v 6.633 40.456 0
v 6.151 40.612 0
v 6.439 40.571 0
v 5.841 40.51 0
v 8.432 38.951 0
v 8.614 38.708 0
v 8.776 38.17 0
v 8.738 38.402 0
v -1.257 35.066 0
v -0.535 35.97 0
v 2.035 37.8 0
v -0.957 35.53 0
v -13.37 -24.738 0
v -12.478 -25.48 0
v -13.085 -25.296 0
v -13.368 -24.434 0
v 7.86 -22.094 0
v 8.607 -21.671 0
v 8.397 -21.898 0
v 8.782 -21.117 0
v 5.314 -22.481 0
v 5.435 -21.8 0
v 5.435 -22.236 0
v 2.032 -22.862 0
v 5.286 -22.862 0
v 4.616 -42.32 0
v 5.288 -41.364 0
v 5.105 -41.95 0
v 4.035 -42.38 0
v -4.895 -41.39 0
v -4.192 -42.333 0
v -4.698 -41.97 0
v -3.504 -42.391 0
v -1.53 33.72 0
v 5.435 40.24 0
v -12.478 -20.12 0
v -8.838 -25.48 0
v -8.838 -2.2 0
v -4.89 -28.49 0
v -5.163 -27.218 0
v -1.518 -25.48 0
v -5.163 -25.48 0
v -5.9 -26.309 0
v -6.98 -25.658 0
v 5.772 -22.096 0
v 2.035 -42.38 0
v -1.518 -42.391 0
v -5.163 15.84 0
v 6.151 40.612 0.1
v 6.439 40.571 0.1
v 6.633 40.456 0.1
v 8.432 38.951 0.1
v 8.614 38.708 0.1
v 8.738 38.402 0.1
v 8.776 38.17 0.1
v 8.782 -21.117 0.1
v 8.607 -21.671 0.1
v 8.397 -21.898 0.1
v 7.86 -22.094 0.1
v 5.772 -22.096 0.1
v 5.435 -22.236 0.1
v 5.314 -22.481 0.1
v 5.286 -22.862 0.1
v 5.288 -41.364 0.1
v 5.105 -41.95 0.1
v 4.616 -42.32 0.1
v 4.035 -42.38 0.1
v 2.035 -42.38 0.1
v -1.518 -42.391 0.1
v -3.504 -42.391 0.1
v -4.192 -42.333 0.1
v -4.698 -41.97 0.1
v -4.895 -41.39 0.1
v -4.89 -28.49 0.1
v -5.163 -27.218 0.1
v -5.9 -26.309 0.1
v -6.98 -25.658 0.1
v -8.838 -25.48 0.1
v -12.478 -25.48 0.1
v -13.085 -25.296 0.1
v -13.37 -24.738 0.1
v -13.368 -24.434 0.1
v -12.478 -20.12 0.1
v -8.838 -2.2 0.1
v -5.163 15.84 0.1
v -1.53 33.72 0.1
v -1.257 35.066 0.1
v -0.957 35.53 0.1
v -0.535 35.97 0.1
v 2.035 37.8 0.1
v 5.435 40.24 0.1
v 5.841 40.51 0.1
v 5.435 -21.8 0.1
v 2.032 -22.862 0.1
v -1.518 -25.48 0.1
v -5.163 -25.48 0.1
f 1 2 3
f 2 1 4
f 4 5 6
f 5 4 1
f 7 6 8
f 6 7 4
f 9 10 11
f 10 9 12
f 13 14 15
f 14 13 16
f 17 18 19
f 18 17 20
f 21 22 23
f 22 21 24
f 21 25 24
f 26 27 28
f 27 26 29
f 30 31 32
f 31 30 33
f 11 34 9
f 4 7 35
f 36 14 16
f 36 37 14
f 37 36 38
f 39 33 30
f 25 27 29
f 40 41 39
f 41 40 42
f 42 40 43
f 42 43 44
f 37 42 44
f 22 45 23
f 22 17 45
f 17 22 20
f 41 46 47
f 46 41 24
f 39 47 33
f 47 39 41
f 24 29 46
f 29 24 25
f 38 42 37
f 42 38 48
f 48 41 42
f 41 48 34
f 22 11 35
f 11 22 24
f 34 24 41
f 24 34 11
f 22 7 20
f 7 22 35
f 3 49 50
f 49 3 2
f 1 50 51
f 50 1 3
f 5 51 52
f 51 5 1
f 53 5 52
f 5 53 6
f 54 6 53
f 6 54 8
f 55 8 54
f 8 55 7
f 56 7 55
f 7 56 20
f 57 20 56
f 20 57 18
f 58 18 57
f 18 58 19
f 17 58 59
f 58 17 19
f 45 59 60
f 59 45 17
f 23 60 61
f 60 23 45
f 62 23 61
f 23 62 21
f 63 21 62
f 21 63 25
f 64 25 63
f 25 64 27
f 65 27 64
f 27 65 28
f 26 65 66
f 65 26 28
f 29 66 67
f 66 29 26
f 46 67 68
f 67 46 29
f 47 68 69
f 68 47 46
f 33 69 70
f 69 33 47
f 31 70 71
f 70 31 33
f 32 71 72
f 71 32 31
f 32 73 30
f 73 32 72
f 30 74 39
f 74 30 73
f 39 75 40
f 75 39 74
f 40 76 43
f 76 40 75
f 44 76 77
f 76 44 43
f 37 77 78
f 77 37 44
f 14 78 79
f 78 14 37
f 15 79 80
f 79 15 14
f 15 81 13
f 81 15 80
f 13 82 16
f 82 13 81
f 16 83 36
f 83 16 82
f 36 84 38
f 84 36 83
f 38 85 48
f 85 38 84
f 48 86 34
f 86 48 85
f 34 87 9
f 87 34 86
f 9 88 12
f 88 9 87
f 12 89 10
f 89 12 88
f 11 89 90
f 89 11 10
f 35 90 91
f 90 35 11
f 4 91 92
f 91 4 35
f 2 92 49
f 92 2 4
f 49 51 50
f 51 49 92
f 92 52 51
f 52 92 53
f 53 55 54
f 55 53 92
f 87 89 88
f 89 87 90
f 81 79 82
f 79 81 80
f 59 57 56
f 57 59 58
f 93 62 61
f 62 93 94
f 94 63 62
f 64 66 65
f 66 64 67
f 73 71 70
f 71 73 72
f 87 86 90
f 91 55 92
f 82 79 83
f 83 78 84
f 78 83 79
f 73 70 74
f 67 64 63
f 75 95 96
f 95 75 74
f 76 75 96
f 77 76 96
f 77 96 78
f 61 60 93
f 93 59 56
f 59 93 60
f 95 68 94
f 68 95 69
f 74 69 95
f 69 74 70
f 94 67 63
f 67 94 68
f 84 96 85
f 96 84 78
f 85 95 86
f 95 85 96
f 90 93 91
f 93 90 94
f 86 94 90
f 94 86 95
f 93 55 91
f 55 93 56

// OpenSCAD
// file: s/13710gs02.scad
use <../../lib.scad>
function ldraw_lib__s__13710gs02() = [
// 0 ~Sticker Top for Technic Panel Fairing Smooth (Long) Flat
// 0 Name: s\13710gs02.dat
// 0 Author: Philippe Hurbain [Philo]
// 0 !LDRAW_ORG Subpart UPDATE 2022-02
// 0 !LICENSE Licensed under CC BY 2.0 and CC BY 4.0 : see CAreadme.txt
// 
// 0 BFC CERTIFY CCW
  [0,"BFC","CERTIFY"],
  [0,"BFC","CCW"],
// 
// 0 !HISTORY 2022-03-06 [PTadmin] Official Update 2022-02
// 
// 
// 0 // Top surface
// 4 16 -14.602 -0.25 101.275 -15.378 -0.25 101.529 -16.097 -0.25 101.427 -16.582 -0.25 101.141
  [4,16,-14.602,-0.25,101.275,-15.378,-0.25,101.529,-16.097,-0.25,101.427,-16.582,-0.25,101.141],
// 4 16 -14.602 -0.25 101.275 -16.582 -0.25 101.141 -21.08 -0.25 97.378 -21.536 -0.25 96.769
  [4,16,-14.602,-0.25,101.275,-16.582,-0.25,101.141,-21.08,-0.25,97.378,-21.536,-0.25,96.769],
// 4 16 -14.602 -0.25 101.275 -21.536 -0.25 96.769 -21.844 -0.25 96.005 -21.94 -0.25 95.424
  [4,16,-14.602,-0.25,101.275,-21.536,-0.25,96.769,-21.844,-0.25,96.005,-21.94,-0.25,95.424],
// 4 16 3.142 -0.25 87.664 2.393 -0.25 88.826 1.338 -0.25 89.925 -5.087 -0.25 94.5
  [4,16,3.142,-0.25,87.664,2.393,-0.25,88.826,1.338,-0.25,89.925,-5.087,-0.25,94.5],
// 4 16 31.196 -0.25 -63.7 32.713 -0.25 -63.241 33.424 -0.25 -61.844 33.421 -0.25 -61.086
  [4,16,31.196,-0.25,-63.7,32.713,-0.25,-63.241,33.424,-0.25,-61.844,33.421,-0.25,-61.086],
// 4 16 -21.954 -0.25 -52.792 -21.518 -0.25 -54.177 -20.993 -0.25 -54.745 -19.65 -0.25 -55.236
  [4,16,-21.954,-0.25,-52.792,-21.518,-0.25,-54.177,-20.993,-0.25,-54.745,-19.65,-0.25,-55.236],
// 4 16 -13.588 -0.25 -55.589 -13.286 -0.25 -56.203 -5.08 -0.25 -57.154 -13.588 -0.25 -54.5
  [4,16,-13.588,-0.25,-55.589,-13.286,-0.25,-56.203,-5.08,-0.25,-57.154,-13.588,-0.25,-54.5],
// 3 16 -13.286 -0.25 -56.203 -13.216 -0.25 -57.156 -5.08 -0.25 -57.154
  [3,16,-13.286,-0.25,-56.203,-13.216,-0.25,-57.156,-5.08,-0.25,-57.154],
// 4 16 -13.22 -0.25 -103.409 -12.762 -0.25 -104.875 -11.54 -0.25 -105.799 -10.088 -0.25 -105.95
  [4,16,-13.22,-0.25,-103.409,-12.762,-0.25,-104.875,-11.54,-0.25,-105.799,-10.088,-0.25,-105.95],
// 4 16 8.76 -0.25 -105.977 10.481 -0.25 -105.833 11.744 -0.25 -104.924 12.237 -0.25 -103.474
  [4,16,8.76,-0.25,-105.977,10.481,-0.25,-105.833,11.744,-0.25,-104.924,12.237,-0.25,-103.474],
// 3 16 -5.087 -0.25 94.5 3.826 -0.25 84.3 3.142 -0.25 87.664
  [3,16,-5.087,-0.25,94.5,3.826,-0.25,84.3,3.142,-0.25,87.664],
// 3 16 -14.602 -0.25 101.275 -21.94 -0.25 95.424 -13.588 -0.25 100.6
  [3,16,-14.602,-0.25,101.275,-21.94,-0.25,95.424,-13.588,-0.25,100.6],
// 3 16 31.196 -0.25 -50.3 31.196 -0.25 -63.7 33.421 -0.25 -61.086
  [3,16,31.196,-0.25,-50.3,31.196,-0.25,-63.7,33.421,-0.25,-61.086],
// 4 16 22.095 -0.25 -63.7 31.196 -0.25 -63.7 31.196 -0.25 -50.3 22.095 -0.25 -5.5
  [4,16,22.095,-0.25,-63.7,31.196,-0.25,-63.7,31.196,-0.25,-50.3,22.095,-0.25,-5.5],
// 3 16 12.225 -0.25 -71.225 8.76 -0.25 -105.977 12.237 -0.25 -103.474
  [3,16,12.225,-0.25,-71.225,8.76,-0.25,-105.977,12.237,-0.25,-103.474],
// 3 16 -13.216 -0.25 -57.156 -13.22 -0.25 -103.409 -10.088 -0.25 -105.95
  [3,16,-13.216,-0.25,-57.156,-13.22,-0.25,-103.409,-10.088,-0.25,-105.95],
// 4 16 3.795 -0.25 -63.7 12.225 -0.25 -71.225 12.908 -0.25 -68.044 12.908 -0.25 -63.7
  [4,16,3.795,-0.25,-63.7,12.225,-0.25,-71.225,12.908,-0.25,-68.044,12.908,-0.25,-63.7],
// 3 16 12.908 -0.25 -63.7 12.908 -0.25 -68.044 14.749 -0.25 -65.772
  [3,16,12.908,-0.25,-63.7,12.908,-0.25,-68.044,14.749,-0.25,-65.772],
// 3 16 12.908 -0.25 -63.7 14.749 -0.25 -65.772 17.451 -0.25 -64.144
  [3,16,12.908,-0.25,-63.7,14.749,-0.25,-65.772,17.451,-0.25,-64.144],
// 3 16 22.095 -0.25 -63.7 12.908 -0.25 -63.7 17.451 -0.25 -64.144
  [3,16,22.095,-0.25,-63.7,12.908,-0.25,-63.7,17.451,-0.25,-64.144],
// 3 16 -13.588 -0.25 -54.5 -14.429 -0.25 -55.241 -13.588 -0.25 -55.589
  [3,16,-13.588,-0.25,-54.5,-14.429,-0.25,-55.241,-13.588,-0.25,-55.589],
// 4 16 -19.65 -0.25 -55.236 -14.429 -0.25 -55.241 -13.588 -0.25 -54.5 -21.954 -0.25 -52.792
  [4,16,-19.65,-0.25,-55.236,-14.429,-0.25,-55.241,-13.588,-0.25,-54.5,-21.954,-0.25,-52.792],
// 4 16 -5.08 -0.25 -57.154 -5.087 -0.25 -105.95 3.795 -0.25 -105.977 3.795 -0.25 -63.7
  [4,16,-5.08,-0.25,-57.154,-5.087,-0.25,-105.95,3.795,-0.25,-105.977,3.795,-0.25,-63.7],
// 4 16 3.795 -0.25 -63.7 3.795 -0.25 -105.977 8.76 -0.25 -105.977 12.225 -0.25 -71.225
  [4,16,3.795,-0.25,-63.7,3.795,-0.25,-105.977,8.76,-0.25,-105.977,12.225,-0.25,-71.225],
// 4 16 -10.088 -0.25 -105.95 -5.087 -0.25 -105.95 -5.08 -0.25 -57.154 -13.216 -0.25 -57.156
  [4,16,-10.088,-0.25,-105.95,-5.087,-0.25,-105.95,-5.08,-0.25,-57.154,-13.216,-0.25,-57.156],
// 4 16 12.908 -0.25 -63.7 22.095 -0.25 -63.7 22.095 -0.25 -5.5 12.908 -0.25 39.6
  [4,16,12.908,-0.25,-63.7,22.095,-0.25,-63.7,22.095,-0.25,-5.5,12.908,-0.25,39.6],
// 4 16 3.795 -0.25 -63.7 12.908 -0.25 -63.7 12.908 -0.25 39.6 3.826 -0.25 84.3
  [4,16,3.795,-0.25,-63.7,12.908,-0.25,-63.7,12.908,-0.25,39.6,3.826,-0.25,84.3],
// 4 16 -5.087 -0.25 94.5 -13.588 -0.25 100.6 -13.588 -0.25 -54.5 -5.08 -0.25 -57.154
  [4,16,-5.087,-0.25,94.5,-13.588,-0.25,100.6,-13.588,-0.25,-54.5,-5.08,-0.25,-57.154],
// 4 16 3.826 -0.25 84.3 -5.087 -0.25 94.5 -5.08 -0.25 -57.154 3.795 -0.25 -63.7
  [4,16,3.826,-0.25,84.3,-5.087,-0.25,94.5,-5.08,-0.25,-57.154,3.795,-0.25,-63.7],
// 4 16 -13.588 -0.25 100.6 -21.94 -0.25 95.424 -21.954 -0.25 -52.792 -13.588 -0.25 -54.5
  [4,16,-13.588,-0.25,100.6,-21.94,-0.25,95.424,-21.954,-0.25,-52.792,-13.588,-0.25,-54.5],
];
module ldraw_lib__s__13710gs02(step=0, col=false, unit=2/5, alt=false, line=0.2, solid=!$preview)
    makepoly(ldraw_lib__s__13710gs02(), step=step, col=col, unit=unit, alt=alt, line=line, solid=solid);
ldraw_lib__s__13710gs02(line=0.2);
// main file
use <../lib.scad>
use <s/13710gs01.scad>
use <s/13710gs02.scad>
function ldraw_lib__13710i() = [
// 0 Sticker Mindstorms EV3 #9 for Panel Smooth Long (Needs Work)
// 0 Name: 13710i.dat
// 0 Author: Philippe Hurbain [Philo]
// 0 !LDRAW_ORG Part UPDATE 2022-02
// 0 !LICENSE Licensed under CC BY 2.0 and CC BY 4.0 : see CAreadme.txt
// 
// 0 !HELP To be used with panel 64681
// 
// 0 BFC CERTIFY CCW
  [0,"BFC","CERTIFY"],
  [0,"BFC","CCW"],
// 
// 0 !HISTORY 2022-03-06 [PTadmin] Official Update 2022-02
// 
// 
// 0 // Image file courtesy of the LEGO MINDSTORMS Team
// 0 // Needs Work: Missing more detailed fallback pattern
// 
// 1 16 0 0 0 -1 0 0 0 1 0 0 0 1 s\13710gs01.dat
  [1,16,0,0,0,-1,0,0,0,1,0,0,0,1, ldraw_lib__s__13710gs01()],
// 0 !TEXMAP START PLANAR -33.424 12.0264 -105.977 -33.424 12.0264 101.529 21.954 12.0264 -105.977 13710i.png
// 0 !: 1 15 0 0 0 -1 0 0 0 1 0 0 0 1 s\13710gs02.dat
// 0 !TEXMAP FALLBACK
// 1 15 0 0 0 -1 0 0 0 1 0 0 0 1 s\13710gs02.dat
  [1,15,0,0,0,-1,0,0,0,1,0,0,0,1, ldraw_lib__s__13710gs02()],
// 0 !TEXMAP END
];
module ldraw_lib__13710i(step=0, col=false, unit=2/5, alt=false, line=0.2, solid=!$preview)
    makepoly(ldraw_lib__13710i(), step=step, col=col, unit=unit, alt=alt, line=line, solid=solid);
ldraw_lib__13710i(line=0.2);
